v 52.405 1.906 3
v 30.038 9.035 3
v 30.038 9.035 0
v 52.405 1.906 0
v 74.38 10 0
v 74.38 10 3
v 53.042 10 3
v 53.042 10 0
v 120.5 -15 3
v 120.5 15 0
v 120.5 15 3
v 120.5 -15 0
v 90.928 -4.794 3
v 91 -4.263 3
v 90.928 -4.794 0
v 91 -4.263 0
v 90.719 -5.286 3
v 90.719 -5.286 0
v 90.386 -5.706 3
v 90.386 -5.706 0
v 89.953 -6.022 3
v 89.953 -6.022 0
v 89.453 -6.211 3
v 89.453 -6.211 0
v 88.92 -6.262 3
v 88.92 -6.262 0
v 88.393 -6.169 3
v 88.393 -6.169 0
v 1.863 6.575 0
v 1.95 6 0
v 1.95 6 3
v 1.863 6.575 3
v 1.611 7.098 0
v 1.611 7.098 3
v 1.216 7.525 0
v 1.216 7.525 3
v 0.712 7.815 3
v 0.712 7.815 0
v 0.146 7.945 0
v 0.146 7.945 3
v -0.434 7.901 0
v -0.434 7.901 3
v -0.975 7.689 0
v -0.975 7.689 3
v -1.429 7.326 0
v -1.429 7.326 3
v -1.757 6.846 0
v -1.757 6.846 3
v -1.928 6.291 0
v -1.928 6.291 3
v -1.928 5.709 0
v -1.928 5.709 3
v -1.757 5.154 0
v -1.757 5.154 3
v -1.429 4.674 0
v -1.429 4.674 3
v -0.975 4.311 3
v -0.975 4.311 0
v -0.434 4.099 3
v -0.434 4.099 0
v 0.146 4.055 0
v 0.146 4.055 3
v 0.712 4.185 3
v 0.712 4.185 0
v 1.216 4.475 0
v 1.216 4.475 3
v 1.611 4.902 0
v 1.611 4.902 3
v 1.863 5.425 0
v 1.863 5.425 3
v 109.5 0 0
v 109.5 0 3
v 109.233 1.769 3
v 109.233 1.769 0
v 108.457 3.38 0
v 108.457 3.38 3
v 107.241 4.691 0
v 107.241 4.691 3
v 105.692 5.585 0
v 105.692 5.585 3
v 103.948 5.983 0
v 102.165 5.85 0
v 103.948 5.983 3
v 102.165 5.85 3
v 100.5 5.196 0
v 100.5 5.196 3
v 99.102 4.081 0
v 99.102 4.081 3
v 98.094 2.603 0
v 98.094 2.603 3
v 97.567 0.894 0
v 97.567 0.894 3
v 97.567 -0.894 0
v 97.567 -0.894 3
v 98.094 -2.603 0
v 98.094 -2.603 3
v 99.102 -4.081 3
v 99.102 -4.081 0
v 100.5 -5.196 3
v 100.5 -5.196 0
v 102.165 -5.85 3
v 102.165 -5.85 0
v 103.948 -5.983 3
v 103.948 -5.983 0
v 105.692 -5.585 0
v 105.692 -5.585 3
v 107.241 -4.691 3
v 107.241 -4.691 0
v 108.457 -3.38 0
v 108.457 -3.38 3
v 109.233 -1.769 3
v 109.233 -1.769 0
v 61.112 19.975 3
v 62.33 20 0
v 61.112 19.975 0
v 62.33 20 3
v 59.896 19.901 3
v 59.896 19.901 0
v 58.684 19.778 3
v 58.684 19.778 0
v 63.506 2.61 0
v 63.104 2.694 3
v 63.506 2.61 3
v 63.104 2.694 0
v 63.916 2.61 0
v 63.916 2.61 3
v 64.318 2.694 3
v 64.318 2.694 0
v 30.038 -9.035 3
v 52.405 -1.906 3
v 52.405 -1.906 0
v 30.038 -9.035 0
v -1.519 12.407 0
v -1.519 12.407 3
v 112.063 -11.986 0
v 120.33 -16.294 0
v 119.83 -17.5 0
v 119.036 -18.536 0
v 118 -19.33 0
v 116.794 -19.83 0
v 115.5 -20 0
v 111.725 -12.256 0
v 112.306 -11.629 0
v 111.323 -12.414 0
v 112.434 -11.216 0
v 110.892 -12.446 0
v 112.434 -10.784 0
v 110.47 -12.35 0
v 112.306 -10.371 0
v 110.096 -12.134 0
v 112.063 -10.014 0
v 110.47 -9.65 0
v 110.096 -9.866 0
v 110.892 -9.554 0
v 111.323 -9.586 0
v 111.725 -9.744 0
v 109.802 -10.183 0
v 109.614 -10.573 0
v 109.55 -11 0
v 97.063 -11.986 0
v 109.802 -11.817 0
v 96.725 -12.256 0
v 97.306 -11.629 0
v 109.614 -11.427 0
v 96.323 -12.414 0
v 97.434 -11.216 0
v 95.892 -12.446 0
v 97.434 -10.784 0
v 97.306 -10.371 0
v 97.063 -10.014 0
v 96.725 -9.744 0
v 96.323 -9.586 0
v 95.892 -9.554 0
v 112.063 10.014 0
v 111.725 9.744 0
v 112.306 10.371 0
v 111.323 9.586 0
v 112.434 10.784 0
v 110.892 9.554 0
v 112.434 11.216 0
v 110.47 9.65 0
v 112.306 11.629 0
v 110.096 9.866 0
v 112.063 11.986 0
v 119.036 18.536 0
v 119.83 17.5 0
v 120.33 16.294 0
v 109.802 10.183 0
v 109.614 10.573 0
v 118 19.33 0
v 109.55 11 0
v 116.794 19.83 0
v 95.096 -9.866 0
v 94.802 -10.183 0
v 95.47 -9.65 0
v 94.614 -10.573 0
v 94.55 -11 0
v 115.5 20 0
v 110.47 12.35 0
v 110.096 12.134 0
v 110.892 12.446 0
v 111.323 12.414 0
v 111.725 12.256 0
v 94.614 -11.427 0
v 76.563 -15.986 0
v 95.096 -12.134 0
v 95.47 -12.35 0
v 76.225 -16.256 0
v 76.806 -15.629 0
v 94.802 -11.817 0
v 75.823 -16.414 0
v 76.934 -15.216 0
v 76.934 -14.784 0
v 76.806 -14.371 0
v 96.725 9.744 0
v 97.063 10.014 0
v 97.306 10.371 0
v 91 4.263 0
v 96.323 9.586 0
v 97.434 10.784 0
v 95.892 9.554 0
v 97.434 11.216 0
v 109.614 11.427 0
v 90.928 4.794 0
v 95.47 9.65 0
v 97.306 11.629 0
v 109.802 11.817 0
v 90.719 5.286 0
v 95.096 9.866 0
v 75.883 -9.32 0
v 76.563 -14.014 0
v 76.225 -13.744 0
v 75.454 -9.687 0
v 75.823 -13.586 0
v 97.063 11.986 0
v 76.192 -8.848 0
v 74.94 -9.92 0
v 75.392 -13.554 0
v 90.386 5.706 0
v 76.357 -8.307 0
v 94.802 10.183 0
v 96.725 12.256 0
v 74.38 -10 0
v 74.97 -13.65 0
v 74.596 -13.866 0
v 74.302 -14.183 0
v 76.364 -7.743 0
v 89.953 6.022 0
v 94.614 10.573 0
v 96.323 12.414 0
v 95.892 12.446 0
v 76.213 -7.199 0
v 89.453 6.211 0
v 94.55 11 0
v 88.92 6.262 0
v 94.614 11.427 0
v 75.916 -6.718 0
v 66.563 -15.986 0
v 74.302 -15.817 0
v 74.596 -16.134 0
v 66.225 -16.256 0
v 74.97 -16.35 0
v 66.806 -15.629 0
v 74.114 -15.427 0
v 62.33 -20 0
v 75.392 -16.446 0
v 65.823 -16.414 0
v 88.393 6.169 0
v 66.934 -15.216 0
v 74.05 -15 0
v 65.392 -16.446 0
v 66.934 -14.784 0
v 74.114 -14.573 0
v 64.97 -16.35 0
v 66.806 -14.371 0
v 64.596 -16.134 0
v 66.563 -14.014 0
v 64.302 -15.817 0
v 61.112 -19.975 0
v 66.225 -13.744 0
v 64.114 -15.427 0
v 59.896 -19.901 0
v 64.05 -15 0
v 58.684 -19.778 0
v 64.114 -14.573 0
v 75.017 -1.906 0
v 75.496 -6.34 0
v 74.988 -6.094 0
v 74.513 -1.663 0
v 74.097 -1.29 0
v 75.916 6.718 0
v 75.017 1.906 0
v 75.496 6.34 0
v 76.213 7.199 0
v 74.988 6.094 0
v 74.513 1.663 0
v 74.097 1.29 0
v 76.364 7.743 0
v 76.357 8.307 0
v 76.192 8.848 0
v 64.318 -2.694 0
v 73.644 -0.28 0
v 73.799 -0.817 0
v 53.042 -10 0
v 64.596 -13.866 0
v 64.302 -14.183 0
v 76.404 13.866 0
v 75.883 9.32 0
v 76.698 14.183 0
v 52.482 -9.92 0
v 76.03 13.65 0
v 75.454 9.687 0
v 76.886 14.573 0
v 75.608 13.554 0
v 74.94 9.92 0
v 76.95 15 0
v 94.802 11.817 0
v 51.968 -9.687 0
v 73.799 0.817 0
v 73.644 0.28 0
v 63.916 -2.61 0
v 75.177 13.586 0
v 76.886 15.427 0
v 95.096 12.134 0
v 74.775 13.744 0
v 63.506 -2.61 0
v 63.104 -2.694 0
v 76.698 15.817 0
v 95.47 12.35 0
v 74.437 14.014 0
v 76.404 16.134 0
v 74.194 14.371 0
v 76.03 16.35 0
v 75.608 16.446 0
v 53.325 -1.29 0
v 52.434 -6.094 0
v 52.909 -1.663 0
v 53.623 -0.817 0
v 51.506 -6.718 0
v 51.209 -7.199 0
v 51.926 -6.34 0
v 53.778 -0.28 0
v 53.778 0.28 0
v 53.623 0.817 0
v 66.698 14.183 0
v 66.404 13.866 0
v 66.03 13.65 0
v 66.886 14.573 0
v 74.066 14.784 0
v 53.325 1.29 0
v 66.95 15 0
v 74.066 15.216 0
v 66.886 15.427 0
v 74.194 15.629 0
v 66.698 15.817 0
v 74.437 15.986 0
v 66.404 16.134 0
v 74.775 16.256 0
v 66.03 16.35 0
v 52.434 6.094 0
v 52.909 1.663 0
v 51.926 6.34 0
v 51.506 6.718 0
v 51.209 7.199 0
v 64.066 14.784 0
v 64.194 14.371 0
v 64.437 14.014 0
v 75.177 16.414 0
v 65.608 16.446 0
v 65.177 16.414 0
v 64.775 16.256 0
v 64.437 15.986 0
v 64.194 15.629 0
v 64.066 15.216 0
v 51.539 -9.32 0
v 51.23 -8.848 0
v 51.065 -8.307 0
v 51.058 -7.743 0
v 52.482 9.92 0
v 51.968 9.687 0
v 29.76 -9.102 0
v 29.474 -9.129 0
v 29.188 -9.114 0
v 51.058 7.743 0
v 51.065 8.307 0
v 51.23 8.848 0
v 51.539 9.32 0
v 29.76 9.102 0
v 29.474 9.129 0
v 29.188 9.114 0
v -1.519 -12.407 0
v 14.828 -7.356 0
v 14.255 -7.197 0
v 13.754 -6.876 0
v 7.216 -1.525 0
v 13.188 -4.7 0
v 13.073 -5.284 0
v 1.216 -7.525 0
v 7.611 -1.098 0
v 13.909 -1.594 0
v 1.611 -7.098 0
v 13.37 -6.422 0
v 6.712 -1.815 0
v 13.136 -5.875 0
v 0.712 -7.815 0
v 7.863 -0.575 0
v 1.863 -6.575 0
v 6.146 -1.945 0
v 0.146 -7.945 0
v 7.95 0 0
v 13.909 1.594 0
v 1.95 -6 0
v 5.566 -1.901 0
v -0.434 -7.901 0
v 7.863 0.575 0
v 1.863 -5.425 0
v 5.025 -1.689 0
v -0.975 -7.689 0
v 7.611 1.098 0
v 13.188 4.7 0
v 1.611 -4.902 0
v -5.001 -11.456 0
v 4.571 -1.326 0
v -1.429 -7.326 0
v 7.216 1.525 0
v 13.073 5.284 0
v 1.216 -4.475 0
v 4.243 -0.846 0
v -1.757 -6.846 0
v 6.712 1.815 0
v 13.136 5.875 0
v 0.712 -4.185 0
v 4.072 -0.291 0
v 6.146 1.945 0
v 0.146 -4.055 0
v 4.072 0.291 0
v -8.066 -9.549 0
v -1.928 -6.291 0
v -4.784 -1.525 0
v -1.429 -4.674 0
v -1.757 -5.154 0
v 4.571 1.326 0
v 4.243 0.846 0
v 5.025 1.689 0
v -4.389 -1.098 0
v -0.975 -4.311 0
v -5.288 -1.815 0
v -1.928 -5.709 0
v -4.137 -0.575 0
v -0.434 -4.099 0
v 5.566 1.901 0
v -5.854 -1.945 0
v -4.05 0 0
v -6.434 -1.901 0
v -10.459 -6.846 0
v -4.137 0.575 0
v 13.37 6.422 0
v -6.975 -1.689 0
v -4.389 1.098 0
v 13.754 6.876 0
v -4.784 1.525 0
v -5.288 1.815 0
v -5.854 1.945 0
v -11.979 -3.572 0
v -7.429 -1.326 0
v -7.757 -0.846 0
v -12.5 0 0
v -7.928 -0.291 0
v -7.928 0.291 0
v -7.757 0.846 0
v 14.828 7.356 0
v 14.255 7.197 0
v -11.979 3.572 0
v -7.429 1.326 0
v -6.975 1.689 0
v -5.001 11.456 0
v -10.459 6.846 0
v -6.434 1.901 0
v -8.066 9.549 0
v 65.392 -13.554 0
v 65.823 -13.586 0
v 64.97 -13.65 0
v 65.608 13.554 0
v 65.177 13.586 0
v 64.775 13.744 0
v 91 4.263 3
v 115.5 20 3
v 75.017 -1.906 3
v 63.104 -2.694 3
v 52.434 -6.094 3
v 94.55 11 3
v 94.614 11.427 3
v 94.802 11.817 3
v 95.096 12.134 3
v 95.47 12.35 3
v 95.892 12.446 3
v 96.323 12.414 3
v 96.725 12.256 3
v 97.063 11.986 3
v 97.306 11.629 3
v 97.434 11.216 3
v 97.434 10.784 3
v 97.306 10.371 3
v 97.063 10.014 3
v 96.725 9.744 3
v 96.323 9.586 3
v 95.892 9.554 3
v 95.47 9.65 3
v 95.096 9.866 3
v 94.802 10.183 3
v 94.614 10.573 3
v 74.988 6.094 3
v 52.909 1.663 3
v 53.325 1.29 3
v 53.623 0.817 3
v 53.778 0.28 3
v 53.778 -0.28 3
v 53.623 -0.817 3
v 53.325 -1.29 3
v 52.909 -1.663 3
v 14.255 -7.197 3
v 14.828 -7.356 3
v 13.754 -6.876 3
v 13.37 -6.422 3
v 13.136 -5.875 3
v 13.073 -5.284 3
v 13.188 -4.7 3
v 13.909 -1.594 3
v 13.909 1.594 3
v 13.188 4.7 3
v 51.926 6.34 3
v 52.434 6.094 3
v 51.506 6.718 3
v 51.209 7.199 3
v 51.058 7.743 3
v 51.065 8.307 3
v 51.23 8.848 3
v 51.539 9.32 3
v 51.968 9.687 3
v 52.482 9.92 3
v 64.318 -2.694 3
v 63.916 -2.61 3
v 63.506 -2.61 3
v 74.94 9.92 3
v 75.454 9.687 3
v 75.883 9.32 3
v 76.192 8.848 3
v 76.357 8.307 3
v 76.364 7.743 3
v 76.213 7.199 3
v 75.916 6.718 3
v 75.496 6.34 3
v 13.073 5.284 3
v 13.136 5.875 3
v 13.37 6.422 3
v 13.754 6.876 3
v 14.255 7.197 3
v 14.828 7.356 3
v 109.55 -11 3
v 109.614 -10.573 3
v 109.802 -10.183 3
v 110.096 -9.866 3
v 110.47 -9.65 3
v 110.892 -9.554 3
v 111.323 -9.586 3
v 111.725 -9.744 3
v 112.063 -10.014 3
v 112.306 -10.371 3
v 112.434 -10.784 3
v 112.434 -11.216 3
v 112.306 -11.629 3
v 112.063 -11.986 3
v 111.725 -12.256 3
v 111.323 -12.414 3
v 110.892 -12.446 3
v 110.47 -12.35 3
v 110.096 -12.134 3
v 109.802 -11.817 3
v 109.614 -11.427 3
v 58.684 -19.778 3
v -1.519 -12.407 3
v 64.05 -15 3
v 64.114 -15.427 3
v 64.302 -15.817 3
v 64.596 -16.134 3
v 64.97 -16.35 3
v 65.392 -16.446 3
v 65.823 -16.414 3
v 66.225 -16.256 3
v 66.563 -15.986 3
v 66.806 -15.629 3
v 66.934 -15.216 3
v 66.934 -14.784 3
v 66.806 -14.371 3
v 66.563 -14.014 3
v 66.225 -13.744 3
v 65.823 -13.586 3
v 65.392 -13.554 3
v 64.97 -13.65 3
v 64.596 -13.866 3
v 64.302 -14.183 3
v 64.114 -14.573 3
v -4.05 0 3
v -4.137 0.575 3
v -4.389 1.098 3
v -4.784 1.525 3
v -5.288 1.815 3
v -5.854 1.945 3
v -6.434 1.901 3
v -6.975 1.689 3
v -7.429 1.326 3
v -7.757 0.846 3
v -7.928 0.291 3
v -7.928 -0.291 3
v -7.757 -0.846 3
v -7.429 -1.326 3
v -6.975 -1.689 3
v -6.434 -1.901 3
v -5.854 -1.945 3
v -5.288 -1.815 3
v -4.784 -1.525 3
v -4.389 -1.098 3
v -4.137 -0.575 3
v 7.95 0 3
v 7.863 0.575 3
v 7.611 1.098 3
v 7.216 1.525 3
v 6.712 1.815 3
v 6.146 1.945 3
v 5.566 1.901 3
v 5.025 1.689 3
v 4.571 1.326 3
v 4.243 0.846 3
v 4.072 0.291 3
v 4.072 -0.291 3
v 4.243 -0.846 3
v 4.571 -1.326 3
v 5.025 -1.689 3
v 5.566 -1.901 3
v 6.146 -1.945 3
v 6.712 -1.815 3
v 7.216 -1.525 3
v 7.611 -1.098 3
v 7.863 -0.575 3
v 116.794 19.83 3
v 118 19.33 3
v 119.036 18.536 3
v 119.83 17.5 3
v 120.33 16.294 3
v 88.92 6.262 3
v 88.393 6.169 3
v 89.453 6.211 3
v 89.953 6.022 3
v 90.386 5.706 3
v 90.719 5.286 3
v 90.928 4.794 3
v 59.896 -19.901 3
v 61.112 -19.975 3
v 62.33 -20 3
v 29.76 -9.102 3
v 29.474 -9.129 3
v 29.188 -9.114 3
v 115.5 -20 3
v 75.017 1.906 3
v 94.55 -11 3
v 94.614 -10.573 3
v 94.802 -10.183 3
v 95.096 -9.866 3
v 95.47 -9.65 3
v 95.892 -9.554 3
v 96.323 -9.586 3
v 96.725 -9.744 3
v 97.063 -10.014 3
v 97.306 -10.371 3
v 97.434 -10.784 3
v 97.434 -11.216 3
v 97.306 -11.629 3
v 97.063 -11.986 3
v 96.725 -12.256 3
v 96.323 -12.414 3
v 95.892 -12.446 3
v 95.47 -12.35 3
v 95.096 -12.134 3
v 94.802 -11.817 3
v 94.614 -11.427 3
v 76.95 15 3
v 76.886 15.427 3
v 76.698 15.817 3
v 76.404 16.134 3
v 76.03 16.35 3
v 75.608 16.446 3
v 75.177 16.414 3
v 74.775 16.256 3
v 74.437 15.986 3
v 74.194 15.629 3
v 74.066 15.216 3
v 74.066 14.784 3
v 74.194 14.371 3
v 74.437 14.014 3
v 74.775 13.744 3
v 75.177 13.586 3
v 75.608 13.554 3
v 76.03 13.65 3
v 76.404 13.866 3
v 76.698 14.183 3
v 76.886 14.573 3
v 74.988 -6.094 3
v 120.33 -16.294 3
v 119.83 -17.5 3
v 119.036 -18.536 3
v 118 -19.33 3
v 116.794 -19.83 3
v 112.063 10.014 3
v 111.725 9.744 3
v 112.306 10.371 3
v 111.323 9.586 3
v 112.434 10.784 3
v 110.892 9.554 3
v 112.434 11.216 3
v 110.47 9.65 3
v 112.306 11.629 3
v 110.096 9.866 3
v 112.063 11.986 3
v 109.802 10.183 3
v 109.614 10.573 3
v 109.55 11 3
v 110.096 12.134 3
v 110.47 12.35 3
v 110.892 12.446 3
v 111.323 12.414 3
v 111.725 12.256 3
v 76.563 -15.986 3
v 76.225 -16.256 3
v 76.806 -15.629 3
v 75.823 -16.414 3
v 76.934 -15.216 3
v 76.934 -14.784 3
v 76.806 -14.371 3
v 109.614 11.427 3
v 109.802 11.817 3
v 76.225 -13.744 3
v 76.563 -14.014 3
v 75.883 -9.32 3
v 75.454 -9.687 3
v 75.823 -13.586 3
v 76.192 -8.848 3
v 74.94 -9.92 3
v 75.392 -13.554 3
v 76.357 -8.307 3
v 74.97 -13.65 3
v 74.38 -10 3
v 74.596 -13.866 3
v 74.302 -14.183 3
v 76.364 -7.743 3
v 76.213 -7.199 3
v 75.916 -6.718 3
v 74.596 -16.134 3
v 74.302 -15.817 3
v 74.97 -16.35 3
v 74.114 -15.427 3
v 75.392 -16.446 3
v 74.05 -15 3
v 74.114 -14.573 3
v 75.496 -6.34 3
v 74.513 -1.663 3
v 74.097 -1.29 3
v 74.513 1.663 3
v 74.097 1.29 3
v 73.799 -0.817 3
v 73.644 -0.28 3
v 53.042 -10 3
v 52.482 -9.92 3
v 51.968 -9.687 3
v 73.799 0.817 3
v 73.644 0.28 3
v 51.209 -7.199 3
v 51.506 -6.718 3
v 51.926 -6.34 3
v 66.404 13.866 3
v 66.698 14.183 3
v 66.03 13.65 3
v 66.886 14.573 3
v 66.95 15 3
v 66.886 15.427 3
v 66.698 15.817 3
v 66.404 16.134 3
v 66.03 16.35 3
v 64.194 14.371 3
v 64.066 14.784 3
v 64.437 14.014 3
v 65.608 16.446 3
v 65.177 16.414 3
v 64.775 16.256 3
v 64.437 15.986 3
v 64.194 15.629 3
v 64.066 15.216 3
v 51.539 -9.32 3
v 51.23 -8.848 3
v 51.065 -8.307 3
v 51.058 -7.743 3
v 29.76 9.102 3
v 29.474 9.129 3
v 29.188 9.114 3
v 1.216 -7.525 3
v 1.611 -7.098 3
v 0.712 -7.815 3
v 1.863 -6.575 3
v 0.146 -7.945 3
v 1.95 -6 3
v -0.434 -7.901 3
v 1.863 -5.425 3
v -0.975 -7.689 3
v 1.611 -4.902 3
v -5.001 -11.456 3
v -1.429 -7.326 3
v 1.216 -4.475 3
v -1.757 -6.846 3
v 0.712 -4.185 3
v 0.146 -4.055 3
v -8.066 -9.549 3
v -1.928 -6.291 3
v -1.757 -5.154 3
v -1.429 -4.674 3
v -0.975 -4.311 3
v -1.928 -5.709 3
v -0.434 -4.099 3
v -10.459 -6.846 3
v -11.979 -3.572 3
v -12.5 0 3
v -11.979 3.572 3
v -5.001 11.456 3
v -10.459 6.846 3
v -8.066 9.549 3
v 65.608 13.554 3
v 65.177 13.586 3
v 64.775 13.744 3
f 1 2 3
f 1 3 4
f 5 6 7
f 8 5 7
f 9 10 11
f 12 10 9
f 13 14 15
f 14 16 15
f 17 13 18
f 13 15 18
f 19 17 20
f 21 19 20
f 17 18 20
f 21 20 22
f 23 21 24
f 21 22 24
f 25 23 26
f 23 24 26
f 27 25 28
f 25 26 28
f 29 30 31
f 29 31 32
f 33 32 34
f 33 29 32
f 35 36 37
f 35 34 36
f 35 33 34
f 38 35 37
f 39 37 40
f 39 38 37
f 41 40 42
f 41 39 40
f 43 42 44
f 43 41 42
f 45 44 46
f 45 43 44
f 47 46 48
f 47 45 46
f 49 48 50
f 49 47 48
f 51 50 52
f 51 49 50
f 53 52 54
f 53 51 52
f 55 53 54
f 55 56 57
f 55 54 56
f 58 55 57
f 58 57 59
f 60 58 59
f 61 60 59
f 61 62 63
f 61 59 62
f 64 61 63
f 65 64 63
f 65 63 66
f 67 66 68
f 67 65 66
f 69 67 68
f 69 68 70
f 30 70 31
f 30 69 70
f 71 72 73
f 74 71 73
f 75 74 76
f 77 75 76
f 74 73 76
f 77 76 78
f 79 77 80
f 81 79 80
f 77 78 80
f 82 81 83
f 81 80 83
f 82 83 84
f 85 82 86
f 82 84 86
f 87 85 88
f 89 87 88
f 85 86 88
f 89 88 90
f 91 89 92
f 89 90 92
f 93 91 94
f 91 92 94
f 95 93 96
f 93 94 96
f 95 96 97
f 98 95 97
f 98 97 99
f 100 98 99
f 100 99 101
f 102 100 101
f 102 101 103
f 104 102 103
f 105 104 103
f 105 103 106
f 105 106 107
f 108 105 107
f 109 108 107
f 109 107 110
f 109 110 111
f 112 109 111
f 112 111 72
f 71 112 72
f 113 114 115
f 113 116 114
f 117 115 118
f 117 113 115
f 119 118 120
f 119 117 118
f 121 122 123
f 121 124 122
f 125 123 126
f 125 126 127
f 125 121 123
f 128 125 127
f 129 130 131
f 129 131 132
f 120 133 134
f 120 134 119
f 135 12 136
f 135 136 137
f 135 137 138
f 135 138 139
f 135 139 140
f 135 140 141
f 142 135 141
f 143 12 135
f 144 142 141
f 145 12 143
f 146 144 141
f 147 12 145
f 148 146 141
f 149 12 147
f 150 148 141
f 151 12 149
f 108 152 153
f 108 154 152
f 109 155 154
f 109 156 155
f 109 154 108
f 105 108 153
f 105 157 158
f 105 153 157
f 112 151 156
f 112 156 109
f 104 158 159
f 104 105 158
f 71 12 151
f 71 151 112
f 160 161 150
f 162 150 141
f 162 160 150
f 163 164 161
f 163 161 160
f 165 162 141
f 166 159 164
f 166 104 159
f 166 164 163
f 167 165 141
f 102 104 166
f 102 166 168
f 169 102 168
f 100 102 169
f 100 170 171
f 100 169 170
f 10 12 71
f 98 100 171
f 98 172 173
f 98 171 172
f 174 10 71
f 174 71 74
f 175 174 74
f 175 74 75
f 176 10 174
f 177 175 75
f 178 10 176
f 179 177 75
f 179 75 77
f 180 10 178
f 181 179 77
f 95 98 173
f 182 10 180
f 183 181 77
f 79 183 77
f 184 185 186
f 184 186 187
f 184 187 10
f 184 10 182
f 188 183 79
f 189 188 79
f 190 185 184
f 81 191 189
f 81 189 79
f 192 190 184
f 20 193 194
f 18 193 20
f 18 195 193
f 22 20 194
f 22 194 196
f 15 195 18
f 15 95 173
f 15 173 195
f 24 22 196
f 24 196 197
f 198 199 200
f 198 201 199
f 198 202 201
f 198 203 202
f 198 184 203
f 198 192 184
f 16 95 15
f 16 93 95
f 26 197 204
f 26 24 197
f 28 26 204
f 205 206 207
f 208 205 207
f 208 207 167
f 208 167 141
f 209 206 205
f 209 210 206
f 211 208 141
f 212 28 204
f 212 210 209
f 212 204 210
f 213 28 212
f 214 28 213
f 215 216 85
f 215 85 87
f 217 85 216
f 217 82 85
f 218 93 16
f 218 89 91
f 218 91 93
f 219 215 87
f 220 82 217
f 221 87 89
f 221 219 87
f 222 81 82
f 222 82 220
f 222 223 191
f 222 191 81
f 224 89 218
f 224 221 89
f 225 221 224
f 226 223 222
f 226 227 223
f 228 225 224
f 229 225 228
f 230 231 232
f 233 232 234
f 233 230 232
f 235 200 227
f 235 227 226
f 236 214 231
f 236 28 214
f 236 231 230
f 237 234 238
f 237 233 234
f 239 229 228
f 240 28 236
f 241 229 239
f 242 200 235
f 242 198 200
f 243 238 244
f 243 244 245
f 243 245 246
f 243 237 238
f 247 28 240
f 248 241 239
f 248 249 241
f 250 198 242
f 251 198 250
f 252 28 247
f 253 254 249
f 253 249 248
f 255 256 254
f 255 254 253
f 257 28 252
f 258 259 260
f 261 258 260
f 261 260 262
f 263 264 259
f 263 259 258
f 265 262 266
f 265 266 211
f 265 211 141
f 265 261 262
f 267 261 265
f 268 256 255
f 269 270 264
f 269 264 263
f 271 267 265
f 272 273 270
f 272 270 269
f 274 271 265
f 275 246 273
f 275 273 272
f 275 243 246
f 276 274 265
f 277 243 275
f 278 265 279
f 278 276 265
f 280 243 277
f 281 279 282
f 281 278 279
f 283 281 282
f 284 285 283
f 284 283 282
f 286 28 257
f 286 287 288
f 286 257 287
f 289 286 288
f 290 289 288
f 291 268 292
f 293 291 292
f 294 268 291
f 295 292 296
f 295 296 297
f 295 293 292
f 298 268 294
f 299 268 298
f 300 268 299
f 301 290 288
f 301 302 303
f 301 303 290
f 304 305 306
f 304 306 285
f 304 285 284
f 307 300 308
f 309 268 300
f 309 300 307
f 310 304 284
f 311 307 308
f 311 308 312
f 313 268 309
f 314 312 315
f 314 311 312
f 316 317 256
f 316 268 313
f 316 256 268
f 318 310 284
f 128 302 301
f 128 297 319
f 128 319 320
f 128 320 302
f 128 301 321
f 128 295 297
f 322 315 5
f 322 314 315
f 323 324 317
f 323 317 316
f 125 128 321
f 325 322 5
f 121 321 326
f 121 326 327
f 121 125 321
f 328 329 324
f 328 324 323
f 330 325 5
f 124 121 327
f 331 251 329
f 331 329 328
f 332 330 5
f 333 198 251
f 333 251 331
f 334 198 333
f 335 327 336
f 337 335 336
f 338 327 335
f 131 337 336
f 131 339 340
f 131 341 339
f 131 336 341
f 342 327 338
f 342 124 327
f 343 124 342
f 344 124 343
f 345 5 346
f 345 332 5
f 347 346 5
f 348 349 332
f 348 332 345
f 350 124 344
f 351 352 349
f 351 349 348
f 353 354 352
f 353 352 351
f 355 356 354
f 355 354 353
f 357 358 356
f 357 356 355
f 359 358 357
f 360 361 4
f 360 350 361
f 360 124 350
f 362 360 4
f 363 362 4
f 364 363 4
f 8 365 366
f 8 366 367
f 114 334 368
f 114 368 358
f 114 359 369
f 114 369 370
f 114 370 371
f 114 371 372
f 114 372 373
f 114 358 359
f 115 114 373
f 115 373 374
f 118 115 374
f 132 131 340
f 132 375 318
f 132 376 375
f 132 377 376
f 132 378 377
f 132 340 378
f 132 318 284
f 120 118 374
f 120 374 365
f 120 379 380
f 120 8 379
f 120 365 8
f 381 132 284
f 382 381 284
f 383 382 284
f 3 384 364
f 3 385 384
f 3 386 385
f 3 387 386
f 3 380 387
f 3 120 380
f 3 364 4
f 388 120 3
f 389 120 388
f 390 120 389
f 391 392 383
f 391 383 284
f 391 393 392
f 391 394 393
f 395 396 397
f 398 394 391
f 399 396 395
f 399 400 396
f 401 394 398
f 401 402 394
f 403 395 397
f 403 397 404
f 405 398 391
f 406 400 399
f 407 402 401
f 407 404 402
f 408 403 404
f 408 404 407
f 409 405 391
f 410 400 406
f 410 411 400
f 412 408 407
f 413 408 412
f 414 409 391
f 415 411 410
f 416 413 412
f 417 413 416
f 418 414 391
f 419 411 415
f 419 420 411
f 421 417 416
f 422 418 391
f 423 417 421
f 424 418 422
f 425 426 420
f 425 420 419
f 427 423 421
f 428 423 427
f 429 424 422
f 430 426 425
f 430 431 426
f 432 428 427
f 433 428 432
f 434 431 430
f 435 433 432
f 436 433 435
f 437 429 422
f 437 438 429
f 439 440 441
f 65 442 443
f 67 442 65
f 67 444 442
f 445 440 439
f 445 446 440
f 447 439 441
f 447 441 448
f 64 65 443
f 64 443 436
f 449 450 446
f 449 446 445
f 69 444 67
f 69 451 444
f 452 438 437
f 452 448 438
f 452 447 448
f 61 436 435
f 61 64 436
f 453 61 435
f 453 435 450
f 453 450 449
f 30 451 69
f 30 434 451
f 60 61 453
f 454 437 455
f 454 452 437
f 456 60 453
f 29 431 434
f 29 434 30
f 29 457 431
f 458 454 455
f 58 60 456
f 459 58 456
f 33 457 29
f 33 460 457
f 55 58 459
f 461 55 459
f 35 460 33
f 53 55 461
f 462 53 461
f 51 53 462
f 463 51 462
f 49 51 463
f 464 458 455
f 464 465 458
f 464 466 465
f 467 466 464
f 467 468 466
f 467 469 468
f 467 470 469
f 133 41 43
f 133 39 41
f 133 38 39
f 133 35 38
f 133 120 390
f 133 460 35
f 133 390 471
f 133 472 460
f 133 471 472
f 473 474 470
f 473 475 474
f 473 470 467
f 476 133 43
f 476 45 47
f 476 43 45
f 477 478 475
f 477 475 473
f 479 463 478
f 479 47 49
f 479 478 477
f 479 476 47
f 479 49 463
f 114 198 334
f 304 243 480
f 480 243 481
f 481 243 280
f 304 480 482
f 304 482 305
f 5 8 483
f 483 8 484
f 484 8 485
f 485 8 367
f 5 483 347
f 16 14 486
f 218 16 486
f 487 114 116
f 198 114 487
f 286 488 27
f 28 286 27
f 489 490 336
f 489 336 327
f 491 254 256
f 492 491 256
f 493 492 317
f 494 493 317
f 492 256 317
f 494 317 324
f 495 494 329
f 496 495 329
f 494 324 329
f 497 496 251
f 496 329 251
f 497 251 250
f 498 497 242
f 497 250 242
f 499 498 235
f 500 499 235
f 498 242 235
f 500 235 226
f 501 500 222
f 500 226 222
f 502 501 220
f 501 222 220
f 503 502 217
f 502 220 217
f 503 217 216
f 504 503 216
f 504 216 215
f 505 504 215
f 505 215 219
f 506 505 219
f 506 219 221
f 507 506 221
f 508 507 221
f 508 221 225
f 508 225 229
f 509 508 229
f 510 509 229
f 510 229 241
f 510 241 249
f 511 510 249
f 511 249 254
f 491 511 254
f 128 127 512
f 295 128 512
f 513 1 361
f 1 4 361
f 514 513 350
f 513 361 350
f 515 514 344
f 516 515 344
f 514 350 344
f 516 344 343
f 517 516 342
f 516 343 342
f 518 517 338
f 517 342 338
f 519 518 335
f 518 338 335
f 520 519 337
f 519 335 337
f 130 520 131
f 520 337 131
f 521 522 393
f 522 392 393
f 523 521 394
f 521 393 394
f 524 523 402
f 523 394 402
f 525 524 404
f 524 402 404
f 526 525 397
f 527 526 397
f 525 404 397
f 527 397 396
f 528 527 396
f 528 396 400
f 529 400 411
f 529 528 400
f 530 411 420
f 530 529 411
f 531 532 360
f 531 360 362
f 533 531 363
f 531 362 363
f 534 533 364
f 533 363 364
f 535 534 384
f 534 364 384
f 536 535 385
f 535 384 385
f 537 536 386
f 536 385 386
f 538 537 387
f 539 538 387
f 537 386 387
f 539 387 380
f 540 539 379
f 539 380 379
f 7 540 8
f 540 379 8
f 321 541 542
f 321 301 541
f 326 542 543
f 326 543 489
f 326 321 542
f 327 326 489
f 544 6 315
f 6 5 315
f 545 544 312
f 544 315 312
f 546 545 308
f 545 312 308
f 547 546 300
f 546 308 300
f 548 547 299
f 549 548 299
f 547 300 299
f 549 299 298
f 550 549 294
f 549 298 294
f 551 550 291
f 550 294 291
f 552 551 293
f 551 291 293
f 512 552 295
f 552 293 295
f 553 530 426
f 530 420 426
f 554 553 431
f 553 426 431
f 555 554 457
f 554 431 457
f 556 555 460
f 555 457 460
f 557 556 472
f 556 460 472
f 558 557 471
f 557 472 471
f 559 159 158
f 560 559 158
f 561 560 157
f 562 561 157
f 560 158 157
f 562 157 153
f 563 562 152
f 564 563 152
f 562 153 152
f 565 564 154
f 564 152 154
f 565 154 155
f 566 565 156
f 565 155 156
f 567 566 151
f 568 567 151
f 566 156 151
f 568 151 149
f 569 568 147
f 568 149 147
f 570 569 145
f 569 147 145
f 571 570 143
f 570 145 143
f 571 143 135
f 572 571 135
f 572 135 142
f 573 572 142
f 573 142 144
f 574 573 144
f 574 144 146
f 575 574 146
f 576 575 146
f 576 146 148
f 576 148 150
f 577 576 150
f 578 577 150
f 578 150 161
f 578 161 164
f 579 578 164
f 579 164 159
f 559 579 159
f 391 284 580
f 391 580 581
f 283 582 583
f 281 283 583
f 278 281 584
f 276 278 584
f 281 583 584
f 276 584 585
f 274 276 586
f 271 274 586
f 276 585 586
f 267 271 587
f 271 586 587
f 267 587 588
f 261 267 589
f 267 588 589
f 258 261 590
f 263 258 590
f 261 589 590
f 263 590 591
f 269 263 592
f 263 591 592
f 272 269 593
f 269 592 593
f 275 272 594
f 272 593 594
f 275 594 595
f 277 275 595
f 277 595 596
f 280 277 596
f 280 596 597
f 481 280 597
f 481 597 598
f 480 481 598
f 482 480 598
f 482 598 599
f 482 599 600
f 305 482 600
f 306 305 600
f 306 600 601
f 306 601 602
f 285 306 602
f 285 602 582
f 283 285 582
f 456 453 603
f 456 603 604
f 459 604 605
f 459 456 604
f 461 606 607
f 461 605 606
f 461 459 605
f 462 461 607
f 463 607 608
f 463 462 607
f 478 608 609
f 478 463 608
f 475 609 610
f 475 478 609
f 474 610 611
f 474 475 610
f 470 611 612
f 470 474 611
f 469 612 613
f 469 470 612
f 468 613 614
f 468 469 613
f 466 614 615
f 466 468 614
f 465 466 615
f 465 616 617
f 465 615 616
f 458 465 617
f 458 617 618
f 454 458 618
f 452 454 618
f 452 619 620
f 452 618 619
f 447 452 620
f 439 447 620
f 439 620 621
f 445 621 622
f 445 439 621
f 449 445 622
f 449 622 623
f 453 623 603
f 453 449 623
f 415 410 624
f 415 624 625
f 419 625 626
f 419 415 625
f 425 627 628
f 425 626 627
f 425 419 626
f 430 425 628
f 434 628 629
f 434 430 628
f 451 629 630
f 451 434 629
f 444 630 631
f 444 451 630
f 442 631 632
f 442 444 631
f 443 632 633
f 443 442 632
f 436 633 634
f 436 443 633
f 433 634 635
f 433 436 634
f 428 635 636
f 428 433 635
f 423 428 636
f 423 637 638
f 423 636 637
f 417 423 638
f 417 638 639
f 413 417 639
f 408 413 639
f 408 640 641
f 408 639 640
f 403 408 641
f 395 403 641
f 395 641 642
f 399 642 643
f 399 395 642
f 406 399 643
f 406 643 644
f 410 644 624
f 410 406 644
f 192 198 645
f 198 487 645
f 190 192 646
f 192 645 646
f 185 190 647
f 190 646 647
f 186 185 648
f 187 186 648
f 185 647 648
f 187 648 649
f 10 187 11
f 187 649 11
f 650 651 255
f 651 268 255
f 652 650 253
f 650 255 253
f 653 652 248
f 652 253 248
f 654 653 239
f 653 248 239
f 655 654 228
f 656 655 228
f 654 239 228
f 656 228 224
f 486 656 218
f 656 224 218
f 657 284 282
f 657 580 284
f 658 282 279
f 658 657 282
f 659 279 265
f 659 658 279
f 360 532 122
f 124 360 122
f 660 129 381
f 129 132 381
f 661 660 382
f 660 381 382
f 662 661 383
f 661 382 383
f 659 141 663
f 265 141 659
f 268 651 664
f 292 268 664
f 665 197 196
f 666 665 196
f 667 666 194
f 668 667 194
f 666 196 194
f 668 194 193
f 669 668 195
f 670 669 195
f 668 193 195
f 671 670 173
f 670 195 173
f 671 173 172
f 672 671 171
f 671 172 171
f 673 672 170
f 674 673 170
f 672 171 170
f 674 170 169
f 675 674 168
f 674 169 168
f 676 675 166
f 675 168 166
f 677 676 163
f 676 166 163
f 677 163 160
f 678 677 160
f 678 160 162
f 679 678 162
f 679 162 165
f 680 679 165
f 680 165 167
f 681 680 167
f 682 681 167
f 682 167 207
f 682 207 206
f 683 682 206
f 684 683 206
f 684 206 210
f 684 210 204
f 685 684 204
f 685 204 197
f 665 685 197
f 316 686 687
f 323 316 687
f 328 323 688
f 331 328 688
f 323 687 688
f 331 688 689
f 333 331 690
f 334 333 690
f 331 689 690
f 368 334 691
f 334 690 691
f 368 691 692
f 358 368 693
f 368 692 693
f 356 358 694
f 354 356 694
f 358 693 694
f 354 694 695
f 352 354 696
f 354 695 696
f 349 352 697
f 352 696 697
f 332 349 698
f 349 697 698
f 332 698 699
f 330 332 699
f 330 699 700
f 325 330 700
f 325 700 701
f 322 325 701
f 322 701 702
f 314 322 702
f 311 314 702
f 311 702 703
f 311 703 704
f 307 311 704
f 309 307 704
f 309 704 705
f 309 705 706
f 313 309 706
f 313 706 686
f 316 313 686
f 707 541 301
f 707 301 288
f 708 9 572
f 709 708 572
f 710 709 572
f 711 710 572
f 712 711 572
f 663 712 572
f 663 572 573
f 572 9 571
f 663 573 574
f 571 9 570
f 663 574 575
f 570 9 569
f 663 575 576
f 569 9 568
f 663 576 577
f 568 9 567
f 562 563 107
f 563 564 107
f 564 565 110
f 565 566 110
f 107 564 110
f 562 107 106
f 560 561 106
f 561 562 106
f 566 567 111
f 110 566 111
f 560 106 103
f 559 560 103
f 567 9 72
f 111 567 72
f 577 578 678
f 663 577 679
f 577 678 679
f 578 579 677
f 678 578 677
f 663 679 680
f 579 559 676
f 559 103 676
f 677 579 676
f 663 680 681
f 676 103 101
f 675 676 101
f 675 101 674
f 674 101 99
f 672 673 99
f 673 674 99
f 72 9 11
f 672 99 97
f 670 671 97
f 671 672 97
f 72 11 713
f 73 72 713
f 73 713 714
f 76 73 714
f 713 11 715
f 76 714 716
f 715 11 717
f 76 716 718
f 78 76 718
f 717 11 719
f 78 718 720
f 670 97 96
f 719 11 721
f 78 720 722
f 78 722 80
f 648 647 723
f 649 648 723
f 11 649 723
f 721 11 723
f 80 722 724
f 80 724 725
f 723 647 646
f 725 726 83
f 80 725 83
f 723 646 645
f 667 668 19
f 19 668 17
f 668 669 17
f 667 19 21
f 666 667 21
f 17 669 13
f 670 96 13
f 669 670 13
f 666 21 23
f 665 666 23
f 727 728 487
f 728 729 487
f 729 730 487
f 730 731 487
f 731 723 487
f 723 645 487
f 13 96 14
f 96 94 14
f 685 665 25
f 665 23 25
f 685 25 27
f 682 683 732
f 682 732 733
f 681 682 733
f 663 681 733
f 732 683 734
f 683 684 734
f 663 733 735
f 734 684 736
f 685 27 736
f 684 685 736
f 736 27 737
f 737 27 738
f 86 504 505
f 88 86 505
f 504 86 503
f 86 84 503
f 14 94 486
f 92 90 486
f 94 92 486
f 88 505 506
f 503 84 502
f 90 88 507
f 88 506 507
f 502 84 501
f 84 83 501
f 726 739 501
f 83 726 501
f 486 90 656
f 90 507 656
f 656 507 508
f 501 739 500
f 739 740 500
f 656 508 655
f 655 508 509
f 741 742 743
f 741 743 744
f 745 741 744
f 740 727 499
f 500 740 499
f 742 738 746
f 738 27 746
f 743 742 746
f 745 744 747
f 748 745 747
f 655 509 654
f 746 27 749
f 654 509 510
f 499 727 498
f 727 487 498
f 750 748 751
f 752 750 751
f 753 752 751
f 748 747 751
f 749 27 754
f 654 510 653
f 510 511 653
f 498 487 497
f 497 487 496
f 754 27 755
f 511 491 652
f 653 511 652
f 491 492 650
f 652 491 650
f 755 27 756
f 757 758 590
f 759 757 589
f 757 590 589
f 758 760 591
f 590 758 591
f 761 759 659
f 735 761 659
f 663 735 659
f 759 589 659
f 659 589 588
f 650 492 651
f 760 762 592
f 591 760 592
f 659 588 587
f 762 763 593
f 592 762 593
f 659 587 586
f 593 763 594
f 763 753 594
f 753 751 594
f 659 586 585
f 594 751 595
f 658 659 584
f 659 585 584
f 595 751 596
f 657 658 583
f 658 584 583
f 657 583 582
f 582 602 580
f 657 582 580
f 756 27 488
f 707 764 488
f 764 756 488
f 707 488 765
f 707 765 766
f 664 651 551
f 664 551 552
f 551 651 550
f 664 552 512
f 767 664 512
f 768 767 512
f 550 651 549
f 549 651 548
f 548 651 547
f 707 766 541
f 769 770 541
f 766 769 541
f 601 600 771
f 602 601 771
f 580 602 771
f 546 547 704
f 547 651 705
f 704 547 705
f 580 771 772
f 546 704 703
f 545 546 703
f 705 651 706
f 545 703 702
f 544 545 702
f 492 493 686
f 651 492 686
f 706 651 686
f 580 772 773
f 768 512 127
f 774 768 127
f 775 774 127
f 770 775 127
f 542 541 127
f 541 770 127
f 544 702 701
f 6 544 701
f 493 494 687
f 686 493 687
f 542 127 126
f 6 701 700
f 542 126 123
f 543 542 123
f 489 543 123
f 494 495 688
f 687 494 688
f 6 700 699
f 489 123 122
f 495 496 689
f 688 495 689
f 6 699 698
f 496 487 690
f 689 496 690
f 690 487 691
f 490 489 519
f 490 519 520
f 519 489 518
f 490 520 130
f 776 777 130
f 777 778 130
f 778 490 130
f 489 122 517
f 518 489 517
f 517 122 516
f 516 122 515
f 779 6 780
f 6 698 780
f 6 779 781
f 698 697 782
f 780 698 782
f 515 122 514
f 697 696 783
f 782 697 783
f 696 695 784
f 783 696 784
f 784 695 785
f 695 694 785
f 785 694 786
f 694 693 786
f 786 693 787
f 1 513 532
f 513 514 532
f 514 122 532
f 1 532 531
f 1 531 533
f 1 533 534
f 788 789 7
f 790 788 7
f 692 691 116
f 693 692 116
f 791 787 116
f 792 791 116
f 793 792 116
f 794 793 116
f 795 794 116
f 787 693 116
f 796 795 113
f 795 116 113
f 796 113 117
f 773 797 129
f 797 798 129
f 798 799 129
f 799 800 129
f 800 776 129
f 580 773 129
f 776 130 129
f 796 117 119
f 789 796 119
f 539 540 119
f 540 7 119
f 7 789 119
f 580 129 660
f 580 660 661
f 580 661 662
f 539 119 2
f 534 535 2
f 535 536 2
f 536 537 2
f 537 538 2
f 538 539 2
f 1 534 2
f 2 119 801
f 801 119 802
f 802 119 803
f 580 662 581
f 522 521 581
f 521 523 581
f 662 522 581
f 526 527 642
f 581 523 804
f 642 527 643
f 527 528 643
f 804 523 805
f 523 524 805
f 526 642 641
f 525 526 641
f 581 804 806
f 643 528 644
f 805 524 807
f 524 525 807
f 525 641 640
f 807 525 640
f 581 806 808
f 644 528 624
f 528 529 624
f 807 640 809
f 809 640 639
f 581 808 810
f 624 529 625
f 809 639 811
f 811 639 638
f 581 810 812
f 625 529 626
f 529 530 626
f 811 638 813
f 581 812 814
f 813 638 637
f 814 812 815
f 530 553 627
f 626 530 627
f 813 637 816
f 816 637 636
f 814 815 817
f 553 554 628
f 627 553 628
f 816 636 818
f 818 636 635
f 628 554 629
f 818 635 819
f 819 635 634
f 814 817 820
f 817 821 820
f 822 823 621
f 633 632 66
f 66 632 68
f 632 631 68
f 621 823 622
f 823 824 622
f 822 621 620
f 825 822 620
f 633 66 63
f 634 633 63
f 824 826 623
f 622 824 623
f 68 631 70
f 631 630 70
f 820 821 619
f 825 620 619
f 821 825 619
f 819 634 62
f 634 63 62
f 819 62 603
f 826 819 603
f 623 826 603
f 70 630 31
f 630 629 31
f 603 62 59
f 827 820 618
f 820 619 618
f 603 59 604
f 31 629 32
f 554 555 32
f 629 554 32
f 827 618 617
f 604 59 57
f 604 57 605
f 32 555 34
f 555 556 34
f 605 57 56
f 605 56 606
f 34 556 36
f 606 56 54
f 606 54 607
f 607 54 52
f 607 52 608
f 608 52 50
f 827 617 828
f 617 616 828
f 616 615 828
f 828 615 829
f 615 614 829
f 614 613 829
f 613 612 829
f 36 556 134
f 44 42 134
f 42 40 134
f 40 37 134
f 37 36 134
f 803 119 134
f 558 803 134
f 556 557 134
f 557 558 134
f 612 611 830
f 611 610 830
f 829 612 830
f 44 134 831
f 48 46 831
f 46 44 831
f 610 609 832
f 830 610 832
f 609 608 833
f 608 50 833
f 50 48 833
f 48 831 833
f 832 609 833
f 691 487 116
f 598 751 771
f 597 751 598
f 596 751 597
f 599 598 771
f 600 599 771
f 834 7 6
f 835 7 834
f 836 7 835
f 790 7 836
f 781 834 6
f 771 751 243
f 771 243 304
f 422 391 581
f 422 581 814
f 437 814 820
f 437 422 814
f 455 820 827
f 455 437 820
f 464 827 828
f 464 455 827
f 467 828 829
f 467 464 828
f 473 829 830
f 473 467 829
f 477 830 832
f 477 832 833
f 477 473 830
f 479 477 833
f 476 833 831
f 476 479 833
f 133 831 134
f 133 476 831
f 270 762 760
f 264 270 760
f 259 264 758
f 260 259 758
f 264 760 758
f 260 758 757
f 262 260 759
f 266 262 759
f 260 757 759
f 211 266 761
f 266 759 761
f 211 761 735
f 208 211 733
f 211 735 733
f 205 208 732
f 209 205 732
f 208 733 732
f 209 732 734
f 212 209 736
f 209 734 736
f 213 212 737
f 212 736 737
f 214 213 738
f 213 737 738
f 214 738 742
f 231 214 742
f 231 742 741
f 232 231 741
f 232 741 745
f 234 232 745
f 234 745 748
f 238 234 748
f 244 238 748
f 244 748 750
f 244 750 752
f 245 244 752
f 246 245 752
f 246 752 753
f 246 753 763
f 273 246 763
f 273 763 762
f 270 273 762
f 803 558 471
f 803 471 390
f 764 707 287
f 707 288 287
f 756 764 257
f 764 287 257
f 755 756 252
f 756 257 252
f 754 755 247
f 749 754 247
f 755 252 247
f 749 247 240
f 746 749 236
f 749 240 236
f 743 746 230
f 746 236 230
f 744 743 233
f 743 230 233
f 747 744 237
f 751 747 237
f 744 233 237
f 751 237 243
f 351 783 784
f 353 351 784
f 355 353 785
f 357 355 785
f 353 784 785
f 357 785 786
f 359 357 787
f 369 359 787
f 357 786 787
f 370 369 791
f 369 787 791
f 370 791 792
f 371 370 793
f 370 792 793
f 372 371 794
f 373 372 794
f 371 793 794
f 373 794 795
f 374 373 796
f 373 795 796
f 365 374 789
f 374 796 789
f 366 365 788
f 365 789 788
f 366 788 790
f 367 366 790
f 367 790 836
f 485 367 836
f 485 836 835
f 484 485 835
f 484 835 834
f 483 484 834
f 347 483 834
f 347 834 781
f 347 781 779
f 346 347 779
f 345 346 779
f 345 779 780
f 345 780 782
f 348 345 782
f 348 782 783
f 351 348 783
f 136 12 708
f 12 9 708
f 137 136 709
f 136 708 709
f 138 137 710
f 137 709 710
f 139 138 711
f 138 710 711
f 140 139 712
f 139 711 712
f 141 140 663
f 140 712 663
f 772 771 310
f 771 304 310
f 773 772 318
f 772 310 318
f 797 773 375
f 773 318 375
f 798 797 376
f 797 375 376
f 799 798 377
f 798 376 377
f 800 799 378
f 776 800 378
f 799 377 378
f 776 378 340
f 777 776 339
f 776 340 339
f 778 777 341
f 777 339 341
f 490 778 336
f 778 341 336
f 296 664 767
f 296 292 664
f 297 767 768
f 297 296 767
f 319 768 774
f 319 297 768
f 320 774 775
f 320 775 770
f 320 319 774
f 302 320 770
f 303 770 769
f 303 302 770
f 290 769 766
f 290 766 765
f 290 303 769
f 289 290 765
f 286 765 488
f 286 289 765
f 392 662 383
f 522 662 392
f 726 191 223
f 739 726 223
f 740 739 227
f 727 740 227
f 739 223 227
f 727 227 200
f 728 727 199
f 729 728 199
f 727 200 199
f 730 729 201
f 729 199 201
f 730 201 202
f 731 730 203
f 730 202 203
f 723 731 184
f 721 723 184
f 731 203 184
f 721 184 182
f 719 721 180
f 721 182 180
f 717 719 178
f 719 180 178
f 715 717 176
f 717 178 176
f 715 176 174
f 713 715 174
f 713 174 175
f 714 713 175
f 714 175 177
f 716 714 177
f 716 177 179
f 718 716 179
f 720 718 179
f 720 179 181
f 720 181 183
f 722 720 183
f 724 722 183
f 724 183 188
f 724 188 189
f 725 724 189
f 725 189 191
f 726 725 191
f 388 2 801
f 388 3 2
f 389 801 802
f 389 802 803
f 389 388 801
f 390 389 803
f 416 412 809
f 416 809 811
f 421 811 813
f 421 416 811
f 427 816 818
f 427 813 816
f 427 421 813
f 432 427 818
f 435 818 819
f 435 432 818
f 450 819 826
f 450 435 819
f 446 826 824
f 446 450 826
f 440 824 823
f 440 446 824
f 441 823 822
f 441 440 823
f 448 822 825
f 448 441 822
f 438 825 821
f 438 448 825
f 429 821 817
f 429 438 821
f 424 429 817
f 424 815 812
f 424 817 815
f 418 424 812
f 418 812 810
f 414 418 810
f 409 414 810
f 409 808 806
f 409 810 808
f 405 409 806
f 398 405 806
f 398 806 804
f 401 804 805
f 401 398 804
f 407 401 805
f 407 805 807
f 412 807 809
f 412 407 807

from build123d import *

# Parameters (mm, degrees)
EXTRUDE_1_DEPTH          = 3
CUT_EXTRUDE_1_DEPTH      = 123.185310083
CUT_EXTRUDE_1_DEPTH_BACK = 123.185310083
SKETCH_2_R               = 1.95
FILLET_1_R               = 5
SKETCH_3_R               = 1.45
CUT_EXTRUDE_2_DEPTH      = 123.185310083
SKETCH_4_R               = 1.45
CUT_EXTRUDE_3_DEPTH      = 123.185310083
FILLET_2_R               = 30
SKETCH_6_R               = 6
CUT_EXTRUDE_4_DEPTH      = 123.185310083
FILLET_3_R               = 2


with BuildPart() as part:
    # 草图1 → 凸台-拉伸1 (new body)
    with BuildSketch(Plane.XY):
        with BuildLine():
            Line((60.5, 20), (120.5, 20))
            Line((120.5, 20), (120.5, -20))
            Line((120.5, -20), (60.5, -20))
            Line((60.5, -20), (-1.51896419, -12.407366674))
            ThreePointArc((-1.51896419, -12.407366674), (-12.5, 0), (-1.51896419, 12.407366674))
            Line((-1.51896419, 12.407366674), (60.5, 20))
        make_face()
    extrude(amount=EXTRUDE_1_DEPTH)

    # 草图2 → 切除-拉伸1 (cut, two sides: drawn at the far end of the back side and taken through both)
    with BuildSketch(Plane.XY.offset(3).offset(-CUT_EXTRUDE_1_DEPTH_BACK)):
        with Locations((0, 6)):
            Circle(SKETCH_2_R)
        with Locations((6, 0)):
            Circle(SKETCH_2_R)
        with Locations((0, -6)):
            Circle(SKETCH_2_R)
        with Locations((-6, 0)):
            Circle(SKETCH_2_R)
    extrude(amount=CUT_EXTRUDE_1_DEPTH + CUT_EXTRUDE_1_DEPTH_BACK, mode=Mode.SUBTRACT)

    # 圆角1
    fillet_1_edges = [part.edges().sort_by_distance(p)[0] for p in [
        (120.5, 20, 1.5),
        (120.5, -20, 1.5),
    ]]
    fillet(fillet_1_edges, radius=FILLET_1_R)

    # 草图3 → 切除-拉伸2 (cut, through all)
    with BuildSketch(Plane(origin=(0, 0, 0), x_dir=(-1, 0, 0), z_dir=(0, 0, -1))):
        with Locations((-111, -11)):
            Circle(SKETCH_3_R)
        with Locations((-111, 11)):
            Circle(SKETCH_3_R)
        with Locations((-96, 11)):
            Circle(SKETCH_3_R)
        with Locations((-96, -11)):
            Circle(SKETCH_3_R)
    extrude(amount=-CUT_EXTRUDE_2_DEPTH, mode=Mode.SUBTRACT)

    # 草图4 → 切除-拉伸3 (cut, through all)
    with BuildSketch(Plane.XY.offset(3)):
        with Locations((75.5, 15)):
            Circle(SKETCH_4_R)
        with Locations((65.5, 15)):
            Circle(SKETCH_4_R)
        with Locations(Location((65.5, -15, 0), (0, 0, 180))):
            Circle(SKETCH_4_R)
        with Locations(Location((75.5, -15, 0), (0, 0, 180))):
            Circle(SKETCH_4_R)
    extrude(amount=-CUT_EXTRUDE_3_DEPTH, mode=Mode.SUBTRACT)

    # 圆角2
    fillet_2_edges = [part.edges().sort_by_distance(p)[0] for p in [
        (60.5, 20, 1.5),
        (60.5, -20, 1.5),
    ]]
    fillet(fillet_2_edges, radius=FILLET_2_R)

    # 草图6 → 切除-拉伸4 (cut, through all)
    with BuildSketch(Plane.XY.offset(3)):
        with Locations((103.5, 0)):
            Circle(SKETCH_6_R)
        with BuildLine():
            Line((12.110641117, 7.023700714), (29.621886423, 9.167504088))
            Line((29.621886423, 9.167504088), (58.382978877, 0))
            Line((58.382978877, 0), (29.621886423, -9.167504088))
            Line((29.621886423, -9.167504088), (12.110641117, -7.023700714))
            ThreePointArc((12.110641117, -7.023700714), (14, 0), (12.110641117, 7.023700714))
        make_face()
        Polygon((40.181331173, -10), (63.710984536, -2.5), (87.240637899, -10), align=None)
        Polygon((40.181331173, 10), (63.710984536, 2.5), (87.240637899, 10), align=None)
        Polygon((91, 7), (69.038990194, 0), (91, -7), align=None)
    extrude(amount=-CUT_EXTRUDE_4_DEPTH, mode=Mode.SUBTRACT)

    # 圆角3
    fillet_3_edges = [part.edges().sort_by_distance(p)[0] for p in [
        (40.181331173, 10, 1.5),
        (87.240637899, 10, 1.5),
        (63.710984536, 2.5, 1.5),
        (91, 7, 1.5),
        (91, -7, 1.5),
        (69.038990194, 0, 1.5),
        (87.240637899, -10, 1.5),
        (40.181331173, -10, 1.5),
        (63.710984536, -2.5, 1.5),
        (12.110641117, -7.023700714, 1.5),
        (12.110641117, 7.023700714, 1.5),
        (29.621886423, 9.167504088, 1.5),
        (58.382978877, 0, 1.5),
        (29.621886423, -9.167504088, 1.5),
    ]]
    fillet(fillet_3_edges, radius=FILLET_3_R)


solid = part.part
